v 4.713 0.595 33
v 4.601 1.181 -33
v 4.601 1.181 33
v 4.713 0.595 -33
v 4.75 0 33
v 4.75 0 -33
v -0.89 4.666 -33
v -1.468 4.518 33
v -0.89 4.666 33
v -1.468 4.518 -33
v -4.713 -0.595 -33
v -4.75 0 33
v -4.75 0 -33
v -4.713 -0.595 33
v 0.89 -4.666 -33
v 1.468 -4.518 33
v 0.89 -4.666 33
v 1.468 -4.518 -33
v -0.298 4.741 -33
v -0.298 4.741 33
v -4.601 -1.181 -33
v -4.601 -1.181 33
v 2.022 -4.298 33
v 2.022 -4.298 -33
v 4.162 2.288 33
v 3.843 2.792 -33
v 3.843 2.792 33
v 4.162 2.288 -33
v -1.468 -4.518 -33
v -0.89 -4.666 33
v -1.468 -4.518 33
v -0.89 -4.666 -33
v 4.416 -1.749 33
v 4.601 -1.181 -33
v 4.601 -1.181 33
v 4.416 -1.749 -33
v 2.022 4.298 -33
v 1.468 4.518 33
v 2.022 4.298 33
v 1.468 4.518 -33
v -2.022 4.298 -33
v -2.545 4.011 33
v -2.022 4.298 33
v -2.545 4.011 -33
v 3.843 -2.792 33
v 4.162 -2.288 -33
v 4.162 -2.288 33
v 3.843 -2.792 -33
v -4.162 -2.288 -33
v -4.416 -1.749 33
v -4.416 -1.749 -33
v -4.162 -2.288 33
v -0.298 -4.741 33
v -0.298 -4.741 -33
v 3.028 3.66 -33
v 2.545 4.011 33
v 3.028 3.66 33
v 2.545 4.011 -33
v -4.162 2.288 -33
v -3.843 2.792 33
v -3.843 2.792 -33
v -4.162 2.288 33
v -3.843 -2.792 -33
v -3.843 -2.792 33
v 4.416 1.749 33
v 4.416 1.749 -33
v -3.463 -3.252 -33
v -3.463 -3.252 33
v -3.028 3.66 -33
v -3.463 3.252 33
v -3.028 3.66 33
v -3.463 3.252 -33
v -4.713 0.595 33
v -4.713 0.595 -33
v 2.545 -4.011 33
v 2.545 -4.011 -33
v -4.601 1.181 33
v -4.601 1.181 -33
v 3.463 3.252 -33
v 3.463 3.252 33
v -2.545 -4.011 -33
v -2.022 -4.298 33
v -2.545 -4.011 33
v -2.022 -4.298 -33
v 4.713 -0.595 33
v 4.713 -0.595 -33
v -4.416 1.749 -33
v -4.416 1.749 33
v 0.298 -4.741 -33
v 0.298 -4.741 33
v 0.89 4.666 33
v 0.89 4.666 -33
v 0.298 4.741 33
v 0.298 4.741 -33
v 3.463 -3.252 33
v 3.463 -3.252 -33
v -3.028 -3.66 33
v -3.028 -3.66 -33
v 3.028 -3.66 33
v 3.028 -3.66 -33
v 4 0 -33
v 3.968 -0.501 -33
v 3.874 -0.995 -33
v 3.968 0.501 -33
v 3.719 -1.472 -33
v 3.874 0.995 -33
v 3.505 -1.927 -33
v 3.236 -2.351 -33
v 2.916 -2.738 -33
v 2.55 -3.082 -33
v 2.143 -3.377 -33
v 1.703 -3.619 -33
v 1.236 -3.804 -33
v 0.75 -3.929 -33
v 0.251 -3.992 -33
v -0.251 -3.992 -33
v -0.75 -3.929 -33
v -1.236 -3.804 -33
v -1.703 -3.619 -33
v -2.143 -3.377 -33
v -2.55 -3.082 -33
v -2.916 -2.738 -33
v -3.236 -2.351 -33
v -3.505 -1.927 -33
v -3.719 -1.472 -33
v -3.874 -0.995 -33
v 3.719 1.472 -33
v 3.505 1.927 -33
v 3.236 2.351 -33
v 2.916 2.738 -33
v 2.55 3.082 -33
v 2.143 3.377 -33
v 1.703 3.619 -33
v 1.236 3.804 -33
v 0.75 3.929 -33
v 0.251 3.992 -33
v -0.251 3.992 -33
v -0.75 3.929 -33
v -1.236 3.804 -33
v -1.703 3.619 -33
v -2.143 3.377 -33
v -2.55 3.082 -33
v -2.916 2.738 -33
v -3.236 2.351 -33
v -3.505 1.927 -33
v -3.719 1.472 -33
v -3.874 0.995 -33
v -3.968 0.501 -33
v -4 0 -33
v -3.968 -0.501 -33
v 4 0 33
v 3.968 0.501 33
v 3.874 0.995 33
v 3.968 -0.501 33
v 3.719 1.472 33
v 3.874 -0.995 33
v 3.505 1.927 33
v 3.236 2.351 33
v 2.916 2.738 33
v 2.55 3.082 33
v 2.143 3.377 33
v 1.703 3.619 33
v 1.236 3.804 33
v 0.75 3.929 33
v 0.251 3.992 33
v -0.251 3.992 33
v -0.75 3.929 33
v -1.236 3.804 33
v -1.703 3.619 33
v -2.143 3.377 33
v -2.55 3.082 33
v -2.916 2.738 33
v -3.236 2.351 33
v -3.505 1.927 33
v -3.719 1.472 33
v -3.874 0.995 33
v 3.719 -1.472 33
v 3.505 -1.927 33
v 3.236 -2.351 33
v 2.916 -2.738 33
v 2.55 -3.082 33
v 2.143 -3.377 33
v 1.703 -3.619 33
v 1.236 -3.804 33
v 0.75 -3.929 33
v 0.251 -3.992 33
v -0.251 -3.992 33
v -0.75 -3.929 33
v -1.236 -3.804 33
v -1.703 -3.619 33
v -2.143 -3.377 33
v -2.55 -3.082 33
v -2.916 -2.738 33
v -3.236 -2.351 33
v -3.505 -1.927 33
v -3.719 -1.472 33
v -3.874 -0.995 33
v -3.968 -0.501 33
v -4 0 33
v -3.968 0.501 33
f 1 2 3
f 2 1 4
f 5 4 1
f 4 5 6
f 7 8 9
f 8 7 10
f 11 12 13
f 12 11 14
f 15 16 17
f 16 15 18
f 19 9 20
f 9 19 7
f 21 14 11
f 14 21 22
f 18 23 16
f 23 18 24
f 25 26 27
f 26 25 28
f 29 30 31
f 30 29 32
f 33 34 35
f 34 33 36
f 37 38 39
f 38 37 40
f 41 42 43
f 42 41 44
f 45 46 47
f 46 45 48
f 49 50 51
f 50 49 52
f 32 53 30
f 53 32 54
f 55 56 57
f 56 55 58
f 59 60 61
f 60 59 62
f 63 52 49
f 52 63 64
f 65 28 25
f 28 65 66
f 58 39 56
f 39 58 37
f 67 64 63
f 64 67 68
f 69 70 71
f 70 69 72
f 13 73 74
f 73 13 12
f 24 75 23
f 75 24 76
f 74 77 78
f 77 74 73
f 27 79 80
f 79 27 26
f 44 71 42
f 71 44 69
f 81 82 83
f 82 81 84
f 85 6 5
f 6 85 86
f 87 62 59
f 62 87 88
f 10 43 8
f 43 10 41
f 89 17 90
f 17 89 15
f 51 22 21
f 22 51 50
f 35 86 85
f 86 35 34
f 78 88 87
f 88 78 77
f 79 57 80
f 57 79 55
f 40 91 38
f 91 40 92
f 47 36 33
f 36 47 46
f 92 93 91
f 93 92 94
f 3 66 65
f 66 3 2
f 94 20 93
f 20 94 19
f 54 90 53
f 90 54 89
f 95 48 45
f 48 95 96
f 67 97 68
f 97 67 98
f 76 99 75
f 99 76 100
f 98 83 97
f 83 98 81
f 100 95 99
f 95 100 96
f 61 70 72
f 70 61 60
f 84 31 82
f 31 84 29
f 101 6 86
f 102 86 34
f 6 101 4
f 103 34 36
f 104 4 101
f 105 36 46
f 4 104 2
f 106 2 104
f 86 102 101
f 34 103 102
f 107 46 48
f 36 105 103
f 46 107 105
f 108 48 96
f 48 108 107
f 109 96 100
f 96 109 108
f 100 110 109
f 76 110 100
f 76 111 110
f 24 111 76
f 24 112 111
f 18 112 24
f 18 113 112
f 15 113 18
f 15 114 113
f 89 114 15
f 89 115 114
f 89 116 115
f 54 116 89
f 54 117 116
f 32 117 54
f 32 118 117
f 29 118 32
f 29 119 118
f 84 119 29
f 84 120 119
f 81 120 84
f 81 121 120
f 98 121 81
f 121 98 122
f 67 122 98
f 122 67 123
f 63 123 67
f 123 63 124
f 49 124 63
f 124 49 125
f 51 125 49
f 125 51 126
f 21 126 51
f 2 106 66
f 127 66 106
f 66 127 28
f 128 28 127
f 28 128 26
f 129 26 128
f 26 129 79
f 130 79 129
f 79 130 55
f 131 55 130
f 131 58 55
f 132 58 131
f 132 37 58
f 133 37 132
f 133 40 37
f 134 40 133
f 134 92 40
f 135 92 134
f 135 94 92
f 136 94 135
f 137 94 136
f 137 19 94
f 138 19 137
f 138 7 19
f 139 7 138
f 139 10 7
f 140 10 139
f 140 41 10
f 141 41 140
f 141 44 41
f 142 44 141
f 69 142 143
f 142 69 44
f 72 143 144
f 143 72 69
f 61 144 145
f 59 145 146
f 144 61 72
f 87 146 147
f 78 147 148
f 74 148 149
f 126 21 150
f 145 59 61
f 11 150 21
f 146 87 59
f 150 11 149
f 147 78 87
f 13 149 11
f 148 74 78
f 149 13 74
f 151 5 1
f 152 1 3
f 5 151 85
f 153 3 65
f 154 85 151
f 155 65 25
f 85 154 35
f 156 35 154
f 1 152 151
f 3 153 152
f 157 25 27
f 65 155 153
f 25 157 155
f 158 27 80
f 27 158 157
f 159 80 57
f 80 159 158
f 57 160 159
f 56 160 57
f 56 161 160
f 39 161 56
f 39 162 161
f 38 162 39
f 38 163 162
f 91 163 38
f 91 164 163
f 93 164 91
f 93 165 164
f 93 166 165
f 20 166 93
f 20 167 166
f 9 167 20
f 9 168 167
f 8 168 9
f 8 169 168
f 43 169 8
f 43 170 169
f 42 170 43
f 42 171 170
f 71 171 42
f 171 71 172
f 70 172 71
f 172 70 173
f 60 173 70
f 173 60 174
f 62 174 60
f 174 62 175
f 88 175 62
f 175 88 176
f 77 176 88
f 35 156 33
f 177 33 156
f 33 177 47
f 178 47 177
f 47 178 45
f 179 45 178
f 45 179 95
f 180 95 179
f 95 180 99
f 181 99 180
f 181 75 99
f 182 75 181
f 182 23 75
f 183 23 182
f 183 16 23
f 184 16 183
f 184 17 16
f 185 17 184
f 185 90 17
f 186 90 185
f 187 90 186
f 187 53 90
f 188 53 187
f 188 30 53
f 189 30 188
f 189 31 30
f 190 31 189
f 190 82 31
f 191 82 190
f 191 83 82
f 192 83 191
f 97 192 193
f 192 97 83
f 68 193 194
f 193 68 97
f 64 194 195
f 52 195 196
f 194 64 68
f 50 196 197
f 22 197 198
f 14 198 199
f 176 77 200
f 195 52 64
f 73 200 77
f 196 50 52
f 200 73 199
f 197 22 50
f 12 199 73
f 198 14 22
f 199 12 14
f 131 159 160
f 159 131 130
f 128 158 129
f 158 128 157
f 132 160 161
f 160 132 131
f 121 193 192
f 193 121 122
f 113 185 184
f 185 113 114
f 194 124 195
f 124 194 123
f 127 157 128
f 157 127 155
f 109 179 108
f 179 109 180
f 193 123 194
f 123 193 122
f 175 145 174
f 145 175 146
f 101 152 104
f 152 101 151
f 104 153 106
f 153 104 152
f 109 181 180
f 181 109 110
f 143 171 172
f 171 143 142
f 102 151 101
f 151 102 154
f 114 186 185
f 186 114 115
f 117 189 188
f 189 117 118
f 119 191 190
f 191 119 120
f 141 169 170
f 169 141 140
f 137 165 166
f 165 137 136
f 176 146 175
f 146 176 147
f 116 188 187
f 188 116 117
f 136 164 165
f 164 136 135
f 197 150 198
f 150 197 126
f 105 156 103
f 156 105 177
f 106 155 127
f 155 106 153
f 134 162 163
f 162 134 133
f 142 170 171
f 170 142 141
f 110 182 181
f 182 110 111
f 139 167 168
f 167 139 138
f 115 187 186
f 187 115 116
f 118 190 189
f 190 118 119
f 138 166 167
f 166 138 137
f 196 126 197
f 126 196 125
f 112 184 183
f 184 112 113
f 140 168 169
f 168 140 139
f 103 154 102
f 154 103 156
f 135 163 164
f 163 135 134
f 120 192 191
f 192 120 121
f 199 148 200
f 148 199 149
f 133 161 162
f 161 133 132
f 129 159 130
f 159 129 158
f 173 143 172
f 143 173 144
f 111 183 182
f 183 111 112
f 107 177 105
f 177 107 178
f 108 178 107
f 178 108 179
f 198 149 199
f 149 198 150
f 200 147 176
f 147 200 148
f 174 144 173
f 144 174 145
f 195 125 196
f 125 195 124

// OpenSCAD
$fn = 50;


difference() {
	union() {
		translate(v = [0, 0, -33.0000000000]) {
			cylinder(h = 66, r = 4.7500000000);
		}
	}
	union() {
		translate(v = [0, 0, -100.0000000000]) {
			cylinder(h = 200, r = 4.0000000000);
		}
	}
}
